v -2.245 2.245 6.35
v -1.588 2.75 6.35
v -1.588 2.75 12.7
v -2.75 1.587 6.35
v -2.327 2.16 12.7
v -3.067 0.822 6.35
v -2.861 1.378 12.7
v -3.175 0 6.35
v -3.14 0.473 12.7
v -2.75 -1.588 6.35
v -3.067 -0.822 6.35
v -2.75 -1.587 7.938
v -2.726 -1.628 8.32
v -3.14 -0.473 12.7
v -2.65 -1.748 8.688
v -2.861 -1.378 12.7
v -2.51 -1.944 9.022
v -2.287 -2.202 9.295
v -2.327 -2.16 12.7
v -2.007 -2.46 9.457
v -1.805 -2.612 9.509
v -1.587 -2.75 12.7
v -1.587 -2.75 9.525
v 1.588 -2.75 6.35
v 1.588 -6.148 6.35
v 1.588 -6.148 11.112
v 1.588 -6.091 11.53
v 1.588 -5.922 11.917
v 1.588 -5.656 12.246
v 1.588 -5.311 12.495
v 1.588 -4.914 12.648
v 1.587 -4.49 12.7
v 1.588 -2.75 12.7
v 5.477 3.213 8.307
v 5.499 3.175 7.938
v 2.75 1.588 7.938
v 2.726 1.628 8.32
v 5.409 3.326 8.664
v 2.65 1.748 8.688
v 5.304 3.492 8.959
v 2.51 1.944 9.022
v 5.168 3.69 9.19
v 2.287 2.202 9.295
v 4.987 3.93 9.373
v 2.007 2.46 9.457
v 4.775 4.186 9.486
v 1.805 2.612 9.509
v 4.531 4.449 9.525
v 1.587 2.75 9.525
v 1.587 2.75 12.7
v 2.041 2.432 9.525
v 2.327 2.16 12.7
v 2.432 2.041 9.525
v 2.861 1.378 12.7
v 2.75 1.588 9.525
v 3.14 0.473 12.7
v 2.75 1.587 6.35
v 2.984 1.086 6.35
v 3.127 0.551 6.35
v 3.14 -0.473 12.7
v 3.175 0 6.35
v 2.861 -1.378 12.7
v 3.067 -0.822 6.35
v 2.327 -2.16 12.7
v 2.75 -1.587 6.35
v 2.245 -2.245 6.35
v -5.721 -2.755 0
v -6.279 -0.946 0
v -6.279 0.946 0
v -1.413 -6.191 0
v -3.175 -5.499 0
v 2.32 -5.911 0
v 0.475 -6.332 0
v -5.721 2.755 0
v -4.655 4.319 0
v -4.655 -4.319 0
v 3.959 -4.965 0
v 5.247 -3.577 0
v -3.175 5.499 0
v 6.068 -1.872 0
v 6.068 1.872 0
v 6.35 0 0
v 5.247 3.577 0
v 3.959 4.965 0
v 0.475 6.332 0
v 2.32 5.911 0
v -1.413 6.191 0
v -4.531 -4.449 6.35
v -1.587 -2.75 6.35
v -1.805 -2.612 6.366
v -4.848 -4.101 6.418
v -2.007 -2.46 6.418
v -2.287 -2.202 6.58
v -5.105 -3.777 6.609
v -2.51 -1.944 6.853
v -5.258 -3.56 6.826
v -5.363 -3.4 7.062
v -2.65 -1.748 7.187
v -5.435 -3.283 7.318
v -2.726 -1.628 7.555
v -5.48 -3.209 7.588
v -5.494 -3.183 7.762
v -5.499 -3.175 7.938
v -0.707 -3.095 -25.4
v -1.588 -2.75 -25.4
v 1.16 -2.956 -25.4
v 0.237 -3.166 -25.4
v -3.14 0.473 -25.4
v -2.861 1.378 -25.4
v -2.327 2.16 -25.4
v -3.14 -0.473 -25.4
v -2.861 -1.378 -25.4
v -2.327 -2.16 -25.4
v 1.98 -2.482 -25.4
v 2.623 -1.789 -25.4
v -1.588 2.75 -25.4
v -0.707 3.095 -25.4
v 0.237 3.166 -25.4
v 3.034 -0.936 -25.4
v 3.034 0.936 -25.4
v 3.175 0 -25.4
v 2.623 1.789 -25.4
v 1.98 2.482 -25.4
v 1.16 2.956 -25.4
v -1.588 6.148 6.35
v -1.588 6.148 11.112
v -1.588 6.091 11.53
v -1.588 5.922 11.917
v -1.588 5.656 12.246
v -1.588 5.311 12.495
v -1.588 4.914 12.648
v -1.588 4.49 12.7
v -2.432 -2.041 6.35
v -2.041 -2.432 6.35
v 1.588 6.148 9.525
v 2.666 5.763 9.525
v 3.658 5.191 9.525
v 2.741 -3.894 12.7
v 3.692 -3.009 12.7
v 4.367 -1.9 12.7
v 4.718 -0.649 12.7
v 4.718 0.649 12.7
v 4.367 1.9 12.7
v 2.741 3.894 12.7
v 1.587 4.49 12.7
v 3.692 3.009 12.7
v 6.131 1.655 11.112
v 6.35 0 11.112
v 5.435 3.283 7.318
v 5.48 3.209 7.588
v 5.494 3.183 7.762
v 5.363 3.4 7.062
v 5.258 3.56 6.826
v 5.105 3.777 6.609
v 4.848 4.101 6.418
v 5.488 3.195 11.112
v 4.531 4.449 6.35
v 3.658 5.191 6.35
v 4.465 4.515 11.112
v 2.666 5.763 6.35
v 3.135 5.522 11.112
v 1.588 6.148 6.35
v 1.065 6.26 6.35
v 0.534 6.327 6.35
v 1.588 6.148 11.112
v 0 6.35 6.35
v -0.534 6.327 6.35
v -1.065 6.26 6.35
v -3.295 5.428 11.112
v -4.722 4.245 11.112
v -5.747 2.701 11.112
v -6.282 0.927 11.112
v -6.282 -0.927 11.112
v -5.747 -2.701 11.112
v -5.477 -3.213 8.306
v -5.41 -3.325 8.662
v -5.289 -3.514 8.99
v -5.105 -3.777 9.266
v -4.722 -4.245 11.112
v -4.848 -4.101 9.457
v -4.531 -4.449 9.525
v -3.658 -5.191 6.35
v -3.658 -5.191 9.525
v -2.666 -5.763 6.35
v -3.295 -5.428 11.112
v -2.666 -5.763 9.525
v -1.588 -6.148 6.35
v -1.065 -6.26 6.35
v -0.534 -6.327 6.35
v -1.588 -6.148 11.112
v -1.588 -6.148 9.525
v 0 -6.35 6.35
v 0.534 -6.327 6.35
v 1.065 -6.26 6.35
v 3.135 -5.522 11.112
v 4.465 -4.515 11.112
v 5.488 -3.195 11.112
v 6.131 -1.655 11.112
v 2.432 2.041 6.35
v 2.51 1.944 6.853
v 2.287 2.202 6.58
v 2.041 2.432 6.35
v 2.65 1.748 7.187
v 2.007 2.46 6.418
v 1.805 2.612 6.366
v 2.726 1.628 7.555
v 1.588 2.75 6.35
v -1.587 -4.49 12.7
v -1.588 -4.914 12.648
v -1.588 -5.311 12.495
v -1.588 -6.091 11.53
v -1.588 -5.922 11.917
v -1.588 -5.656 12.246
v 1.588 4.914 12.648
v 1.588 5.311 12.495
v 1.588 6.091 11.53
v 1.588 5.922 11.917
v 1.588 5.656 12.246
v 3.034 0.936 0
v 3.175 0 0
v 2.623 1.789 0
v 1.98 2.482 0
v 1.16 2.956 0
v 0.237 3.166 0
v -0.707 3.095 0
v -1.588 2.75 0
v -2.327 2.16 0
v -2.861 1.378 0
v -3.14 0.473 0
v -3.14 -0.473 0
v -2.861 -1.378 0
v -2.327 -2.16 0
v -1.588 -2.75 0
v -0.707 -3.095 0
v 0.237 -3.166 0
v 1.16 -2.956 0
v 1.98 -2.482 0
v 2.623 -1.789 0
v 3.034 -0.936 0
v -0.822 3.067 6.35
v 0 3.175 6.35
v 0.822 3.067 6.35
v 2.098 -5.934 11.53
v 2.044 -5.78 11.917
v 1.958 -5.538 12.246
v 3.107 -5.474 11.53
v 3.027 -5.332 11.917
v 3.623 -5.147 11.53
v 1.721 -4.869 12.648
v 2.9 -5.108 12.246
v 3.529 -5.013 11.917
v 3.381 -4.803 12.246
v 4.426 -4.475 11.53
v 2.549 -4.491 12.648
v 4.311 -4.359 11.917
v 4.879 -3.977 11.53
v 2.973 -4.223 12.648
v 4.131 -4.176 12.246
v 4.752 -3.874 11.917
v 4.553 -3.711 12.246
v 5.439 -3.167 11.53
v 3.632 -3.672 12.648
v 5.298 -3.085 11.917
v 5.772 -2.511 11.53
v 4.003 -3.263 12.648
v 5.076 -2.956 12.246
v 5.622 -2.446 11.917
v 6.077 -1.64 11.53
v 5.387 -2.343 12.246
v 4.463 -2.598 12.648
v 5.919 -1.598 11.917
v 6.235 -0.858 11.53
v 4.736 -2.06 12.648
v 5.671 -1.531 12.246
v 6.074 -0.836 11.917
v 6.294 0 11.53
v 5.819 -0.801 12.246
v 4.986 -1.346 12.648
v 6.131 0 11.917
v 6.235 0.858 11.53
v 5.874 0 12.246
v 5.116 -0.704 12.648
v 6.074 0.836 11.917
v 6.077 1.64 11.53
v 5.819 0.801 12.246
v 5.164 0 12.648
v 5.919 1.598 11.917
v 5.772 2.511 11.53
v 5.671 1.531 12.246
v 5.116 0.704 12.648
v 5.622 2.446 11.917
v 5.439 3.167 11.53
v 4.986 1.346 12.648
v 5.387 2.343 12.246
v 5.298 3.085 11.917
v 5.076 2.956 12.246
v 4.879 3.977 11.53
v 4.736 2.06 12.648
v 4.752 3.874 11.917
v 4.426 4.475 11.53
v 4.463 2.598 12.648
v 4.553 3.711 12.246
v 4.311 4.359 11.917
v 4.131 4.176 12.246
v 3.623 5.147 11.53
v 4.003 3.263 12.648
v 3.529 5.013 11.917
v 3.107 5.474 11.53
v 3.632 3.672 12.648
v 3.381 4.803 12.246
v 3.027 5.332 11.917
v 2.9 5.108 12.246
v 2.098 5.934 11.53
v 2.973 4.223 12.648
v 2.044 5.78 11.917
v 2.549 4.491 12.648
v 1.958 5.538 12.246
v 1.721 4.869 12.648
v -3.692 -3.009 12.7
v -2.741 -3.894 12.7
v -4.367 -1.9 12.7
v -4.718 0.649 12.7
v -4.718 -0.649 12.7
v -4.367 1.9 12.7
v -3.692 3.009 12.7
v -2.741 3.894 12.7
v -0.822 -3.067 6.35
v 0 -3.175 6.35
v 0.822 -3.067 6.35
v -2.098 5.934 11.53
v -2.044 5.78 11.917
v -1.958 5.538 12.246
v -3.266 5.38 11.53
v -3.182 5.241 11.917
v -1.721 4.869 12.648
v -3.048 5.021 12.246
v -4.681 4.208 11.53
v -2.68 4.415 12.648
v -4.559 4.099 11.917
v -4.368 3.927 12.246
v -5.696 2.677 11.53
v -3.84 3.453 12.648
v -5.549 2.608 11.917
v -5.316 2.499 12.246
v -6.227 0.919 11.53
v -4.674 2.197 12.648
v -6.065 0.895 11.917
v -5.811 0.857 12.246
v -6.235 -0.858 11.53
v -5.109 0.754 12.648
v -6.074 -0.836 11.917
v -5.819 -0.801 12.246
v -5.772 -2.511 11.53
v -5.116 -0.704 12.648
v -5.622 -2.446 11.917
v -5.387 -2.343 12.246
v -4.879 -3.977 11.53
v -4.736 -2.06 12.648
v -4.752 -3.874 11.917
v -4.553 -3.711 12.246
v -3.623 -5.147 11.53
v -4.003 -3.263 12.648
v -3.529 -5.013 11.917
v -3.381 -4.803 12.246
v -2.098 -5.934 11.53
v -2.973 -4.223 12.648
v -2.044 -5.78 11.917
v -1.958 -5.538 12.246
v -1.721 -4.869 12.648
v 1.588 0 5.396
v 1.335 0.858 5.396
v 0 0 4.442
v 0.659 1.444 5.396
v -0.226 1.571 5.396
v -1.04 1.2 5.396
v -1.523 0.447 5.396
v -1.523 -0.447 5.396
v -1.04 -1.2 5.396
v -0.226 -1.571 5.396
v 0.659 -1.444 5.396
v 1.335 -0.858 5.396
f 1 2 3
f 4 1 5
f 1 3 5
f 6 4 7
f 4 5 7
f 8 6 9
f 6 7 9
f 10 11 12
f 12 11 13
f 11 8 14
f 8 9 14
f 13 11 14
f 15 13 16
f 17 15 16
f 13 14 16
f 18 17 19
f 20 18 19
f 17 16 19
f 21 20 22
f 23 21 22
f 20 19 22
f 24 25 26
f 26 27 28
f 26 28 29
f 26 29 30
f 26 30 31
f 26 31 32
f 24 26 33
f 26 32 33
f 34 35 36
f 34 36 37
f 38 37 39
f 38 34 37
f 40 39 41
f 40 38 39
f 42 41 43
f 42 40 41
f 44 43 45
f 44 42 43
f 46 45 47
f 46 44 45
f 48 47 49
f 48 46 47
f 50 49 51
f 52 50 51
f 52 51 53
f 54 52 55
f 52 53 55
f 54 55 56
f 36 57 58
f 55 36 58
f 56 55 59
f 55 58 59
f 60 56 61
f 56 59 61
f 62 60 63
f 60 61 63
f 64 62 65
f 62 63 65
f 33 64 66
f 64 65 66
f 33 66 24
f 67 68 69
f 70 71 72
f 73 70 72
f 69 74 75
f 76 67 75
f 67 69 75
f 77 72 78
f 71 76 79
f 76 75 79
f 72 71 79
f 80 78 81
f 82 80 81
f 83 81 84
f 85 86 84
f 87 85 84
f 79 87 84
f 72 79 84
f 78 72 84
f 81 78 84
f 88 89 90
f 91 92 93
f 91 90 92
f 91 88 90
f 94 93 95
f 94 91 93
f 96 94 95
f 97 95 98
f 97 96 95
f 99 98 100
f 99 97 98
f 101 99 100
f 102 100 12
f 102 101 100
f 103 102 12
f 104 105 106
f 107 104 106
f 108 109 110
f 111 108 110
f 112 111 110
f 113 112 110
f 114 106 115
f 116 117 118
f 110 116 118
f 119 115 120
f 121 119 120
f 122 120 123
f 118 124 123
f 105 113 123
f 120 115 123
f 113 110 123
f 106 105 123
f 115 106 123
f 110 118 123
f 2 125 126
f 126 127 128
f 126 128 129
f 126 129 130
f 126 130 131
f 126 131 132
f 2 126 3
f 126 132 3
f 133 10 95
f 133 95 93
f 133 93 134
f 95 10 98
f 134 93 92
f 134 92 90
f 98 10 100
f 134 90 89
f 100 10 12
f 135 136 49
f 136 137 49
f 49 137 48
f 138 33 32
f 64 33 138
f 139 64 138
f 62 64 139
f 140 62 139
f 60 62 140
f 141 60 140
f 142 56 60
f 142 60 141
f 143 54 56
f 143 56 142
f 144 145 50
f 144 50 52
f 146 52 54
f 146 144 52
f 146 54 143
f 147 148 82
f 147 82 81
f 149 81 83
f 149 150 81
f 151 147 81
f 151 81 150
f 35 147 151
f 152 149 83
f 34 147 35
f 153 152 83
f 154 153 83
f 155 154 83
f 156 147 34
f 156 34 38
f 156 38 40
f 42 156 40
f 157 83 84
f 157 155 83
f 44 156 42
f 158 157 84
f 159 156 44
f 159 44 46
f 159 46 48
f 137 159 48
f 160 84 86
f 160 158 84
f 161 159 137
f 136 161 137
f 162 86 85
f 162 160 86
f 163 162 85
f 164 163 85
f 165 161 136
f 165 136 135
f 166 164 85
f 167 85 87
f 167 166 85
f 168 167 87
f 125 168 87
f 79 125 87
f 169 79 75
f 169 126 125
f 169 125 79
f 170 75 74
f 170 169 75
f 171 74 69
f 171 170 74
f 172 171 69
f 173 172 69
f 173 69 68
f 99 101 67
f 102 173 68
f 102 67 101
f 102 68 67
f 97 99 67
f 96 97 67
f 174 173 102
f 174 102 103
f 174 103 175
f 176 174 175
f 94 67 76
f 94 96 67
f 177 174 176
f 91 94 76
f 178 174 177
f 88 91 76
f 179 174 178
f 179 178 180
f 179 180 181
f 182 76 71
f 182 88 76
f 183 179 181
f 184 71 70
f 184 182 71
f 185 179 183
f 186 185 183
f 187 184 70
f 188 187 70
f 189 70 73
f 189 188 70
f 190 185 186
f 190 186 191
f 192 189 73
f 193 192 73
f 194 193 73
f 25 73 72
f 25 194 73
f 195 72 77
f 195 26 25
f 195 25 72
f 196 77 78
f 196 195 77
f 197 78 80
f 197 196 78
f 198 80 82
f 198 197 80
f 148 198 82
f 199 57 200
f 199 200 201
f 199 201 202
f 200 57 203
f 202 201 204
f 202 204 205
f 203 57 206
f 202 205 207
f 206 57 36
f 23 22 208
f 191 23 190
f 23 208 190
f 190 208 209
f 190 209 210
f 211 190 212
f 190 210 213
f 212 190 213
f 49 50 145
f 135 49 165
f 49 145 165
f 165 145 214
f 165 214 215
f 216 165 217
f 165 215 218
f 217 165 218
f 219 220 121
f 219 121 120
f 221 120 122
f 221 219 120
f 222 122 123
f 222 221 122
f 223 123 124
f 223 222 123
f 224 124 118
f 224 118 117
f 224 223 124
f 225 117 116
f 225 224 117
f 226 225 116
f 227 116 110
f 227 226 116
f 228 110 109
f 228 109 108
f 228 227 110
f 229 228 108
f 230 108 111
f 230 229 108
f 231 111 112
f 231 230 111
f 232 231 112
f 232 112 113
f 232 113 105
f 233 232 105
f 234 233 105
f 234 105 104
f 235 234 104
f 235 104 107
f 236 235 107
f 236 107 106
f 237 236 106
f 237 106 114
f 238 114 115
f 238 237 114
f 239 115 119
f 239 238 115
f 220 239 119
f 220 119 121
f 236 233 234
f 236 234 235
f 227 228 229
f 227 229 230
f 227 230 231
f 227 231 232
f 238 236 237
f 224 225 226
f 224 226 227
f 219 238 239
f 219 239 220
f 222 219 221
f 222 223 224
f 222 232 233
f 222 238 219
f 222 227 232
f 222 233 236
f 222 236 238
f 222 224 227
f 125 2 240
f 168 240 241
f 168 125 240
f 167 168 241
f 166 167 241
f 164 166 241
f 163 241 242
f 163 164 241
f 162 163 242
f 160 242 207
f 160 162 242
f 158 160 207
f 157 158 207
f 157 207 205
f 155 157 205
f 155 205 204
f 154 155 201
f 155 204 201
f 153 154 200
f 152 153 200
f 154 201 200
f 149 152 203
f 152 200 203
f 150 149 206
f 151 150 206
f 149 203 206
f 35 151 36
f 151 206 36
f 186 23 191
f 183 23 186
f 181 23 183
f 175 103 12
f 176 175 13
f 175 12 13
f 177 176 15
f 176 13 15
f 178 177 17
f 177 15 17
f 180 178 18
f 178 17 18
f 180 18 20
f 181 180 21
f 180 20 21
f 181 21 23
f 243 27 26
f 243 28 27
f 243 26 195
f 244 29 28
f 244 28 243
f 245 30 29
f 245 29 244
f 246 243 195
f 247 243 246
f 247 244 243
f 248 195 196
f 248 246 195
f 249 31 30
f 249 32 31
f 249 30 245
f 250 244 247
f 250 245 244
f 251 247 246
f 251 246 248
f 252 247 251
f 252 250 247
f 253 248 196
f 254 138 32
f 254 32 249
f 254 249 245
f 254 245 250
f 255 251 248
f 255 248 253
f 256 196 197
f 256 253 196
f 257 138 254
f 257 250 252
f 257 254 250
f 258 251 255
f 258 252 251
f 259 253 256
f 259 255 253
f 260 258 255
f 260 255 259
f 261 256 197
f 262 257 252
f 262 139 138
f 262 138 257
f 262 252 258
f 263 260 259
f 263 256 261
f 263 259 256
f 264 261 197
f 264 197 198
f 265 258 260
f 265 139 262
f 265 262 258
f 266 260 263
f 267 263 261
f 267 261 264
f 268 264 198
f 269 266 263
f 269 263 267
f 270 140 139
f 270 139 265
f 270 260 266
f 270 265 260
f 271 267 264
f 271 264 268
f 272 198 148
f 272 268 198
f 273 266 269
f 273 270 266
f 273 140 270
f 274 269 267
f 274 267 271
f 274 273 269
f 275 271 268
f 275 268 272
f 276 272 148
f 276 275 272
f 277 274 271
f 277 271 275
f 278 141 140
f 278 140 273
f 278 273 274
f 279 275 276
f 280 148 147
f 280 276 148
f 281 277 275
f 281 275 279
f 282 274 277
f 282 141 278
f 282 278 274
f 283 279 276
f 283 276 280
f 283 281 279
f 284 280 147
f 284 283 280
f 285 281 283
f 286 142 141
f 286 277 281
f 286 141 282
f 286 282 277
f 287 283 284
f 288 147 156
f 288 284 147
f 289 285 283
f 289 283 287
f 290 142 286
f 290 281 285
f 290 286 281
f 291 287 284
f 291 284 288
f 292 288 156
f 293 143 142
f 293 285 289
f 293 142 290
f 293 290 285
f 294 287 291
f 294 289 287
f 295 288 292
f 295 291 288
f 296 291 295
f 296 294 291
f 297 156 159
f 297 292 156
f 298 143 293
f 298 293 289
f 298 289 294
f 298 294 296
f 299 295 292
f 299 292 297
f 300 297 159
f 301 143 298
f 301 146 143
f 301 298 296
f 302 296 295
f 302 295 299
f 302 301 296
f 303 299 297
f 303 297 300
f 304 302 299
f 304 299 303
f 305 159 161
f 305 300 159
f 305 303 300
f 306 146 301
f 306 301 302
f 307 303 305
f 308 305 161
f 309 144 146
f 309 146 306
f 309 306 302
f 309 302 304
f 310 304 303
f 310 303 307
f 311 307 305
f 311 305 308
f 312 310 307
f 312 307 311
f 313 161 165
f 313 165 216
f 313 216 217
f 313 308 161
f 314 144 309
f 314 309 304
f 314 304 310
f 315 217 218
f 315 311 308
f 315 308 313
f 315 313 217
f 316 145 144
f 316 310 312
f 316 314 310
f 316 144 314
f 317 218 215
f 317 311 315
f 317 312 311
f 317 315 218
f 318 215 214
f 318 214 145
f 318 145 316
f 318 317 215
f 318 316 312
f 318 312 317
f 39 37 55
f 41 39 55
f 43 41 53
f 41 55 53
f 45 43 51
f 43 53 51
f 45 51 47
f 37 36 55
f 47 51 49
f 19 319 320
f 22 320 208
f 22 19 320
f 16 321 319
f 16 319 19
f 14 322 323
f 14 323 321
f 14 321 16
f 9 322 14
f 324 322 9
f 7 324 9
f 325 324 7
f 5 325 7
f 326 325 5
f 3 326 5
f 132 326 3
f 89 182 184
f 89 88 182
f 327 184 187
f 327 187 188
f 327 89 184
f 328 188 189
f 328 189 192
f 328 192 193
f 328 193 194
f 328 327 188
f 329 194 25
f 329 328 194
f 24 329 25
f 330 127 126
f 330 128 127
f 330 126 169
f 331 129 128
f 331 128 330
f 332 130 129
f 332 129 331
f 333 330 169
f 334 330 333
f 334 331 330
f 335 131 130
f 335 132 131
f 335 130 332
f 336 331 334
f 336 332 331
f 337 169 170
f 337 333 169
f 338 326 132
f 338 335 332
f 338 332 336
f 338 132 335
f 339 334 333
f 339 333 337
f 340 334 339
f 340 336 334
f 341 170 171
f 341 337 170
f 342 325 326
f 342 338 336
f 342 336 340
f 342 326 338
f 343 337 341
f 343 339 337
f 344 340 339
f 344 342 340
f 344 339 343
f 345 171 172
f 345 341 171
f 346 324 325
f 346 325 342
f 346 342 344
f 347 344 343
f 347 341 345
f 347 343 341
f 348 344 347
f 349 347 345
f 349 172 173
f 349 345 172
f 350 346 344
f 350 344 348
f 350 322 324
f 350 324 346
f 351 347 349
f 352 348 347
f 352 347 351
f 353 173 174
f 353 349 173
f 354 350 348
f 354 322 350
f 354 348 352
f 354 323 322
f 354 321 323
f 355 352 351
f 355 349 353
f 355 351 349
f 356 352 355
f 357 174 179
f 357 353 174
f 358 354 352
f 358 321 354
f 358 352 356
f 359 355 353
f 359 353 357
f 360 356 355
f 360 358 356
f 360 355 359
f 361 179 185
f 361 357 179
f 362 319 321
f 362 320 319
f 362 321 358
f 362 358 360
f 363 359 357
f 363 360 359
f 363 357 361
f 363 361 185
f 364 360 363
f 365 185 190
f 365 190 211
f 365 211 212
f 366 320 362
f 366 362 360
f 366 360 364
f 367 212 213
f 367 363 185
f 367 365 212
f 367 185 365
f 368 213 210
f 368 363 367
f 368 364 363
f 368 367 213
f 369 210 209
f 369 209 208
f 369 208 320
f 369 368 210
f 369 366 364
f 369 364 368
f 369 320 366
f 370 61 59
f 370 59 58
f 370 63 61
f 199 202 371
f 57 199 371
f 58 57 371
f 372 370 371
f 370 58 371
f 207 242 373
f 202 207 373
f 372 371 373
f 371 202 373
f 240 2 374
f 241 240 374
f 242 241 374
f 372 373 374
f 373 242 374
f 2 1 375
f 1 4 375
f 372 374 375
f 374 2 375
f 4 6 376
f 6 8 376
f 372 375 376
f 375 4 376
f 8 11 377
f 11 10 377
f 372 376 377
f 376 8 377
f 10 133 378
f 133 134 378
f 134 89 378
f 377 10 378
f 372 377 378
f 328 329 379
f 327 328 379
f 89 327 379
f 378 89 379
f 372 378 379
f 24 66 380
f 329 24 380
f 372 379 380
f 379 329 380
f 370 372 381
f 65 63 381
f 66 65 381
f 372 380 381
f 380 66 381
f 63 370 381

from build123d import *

# Parameters (mm, degrees)
F0_R          = 6.35
F1_DEPTH      = 12.7
F2_R          = 3.175
F3_DEPTH      = 25.4
F5_D          = 6.35
F5_DEPTH      = 6.35
F5_TIP        = 1.9077324654
F7_DEPTH      = 6.35
F10_W         = 4.7625
F10_H         = 3.175
F10_W_2       = 4.7752
F11_ANGLE     = 60
F12_T4_DEPTH  = 11.1125
F12_S5_R      = 6.35
F12_T6_DEPTH  = 8
F12_S7_R      = 3.175
F12_T8_DEPTH  = 8
F12_T12_DEPTH = 11.1125
F12_S13_R     = 6.35
F12_T14_DEPTH = 8
F12_S15_R     = 3.175
F12_T16_DEPTH = 8
F12_T20_DEPTH = 11.1125
F12_S21_R     = 6.35
F12_T22_DEPTH = 8
F12_S23_R     = 3.175
F12_T24_DEPTH = 8
F12_T28_DEPTH = 11.1125
F12_S29_R     = 6.35
F12_T30_DEPTH = 8
F12_S31_R     = 3.175
F12_T32_DEPTH = 8
F13_R         = 1.5875


# Not quite as in the source:
# - a fillet or chamfer that OpenCascade refuses, or shapes differently, is made with other operations: its cross-section is extruded or revolved along the edge and cut away or added
# - a feature names something its author has since deleted; it is built from what else it names


with BuildPart() as f1:
    # F0 (on Top) → F1 (new body)
    with BuildSketch(Plane.XY):
        Circle(F0_R)
    extrude(amount=F1_DEPTH)

    # F5
    with Locations(Plane.XY.offset(12.7)):
        with Locations((0, 0)):
            Hole(F5_D / 2, depth=F5_DEPTH)
            with Locations((0, 0, -(F5_DEPTH + F5_TIP / 2))):  # 118° drill point
                Cone(0, F5_D / 2, F5_TIP, mode=Mode.SUBTRACT)

    # F6 (on face) → F7 (cut)
    with BuildSketch(Plane.XY.offset(12.7)):
        with BuildLine():
            Line((-1.5875, -2.749630657), (-1.5875, -6.1483610621))
            ThreePointArc((-1.5875, -6.1483610621), (-0.8001272573, -6.2993885713), (0, -6.35))
            ThreePointArc((0, -6.35), (0.8001272573, -6.2993885713), (1.5875, -6.1483610621))
            Line((1.5875, -6.1483610621), (1.5875, -2.749630657))
            ThreePointArc((1.5875, -2.749630657), (0, -3.175), (-1.5875, -2.749630657))
        make_face()
        with BuildLine():
            ThreePointArc((1.5875, 6.1483610621), (0.8001272573, 6.2993885713), (0, 6.35))
            ThreePointArc((0, 6.35), (-0.8001272573, 6.2993885713), (-1.5875, 6.1483610621))
            Line((-1.5875, 6.1483610621), (-1.5875, 2.749630657))
            ThreePointArc((-1.5875, 2.749630657), (0, 3.175), (1.5875, 2.749630657))
            Line((1.5875, 2.749630657), (1.5875, 6.1483610621))
        make_face()
    extrude(amount=-F7_DEPTH, mode=Mode.SUBTRACT)

    # F10 (on face) → F11 (revolve, cut)
    with BuildSketch(Plane.YZ):
        with Locations((-3.96875, 7.9375)):
            Rectangle(F10_W, F10_H)
        with Locations((3.9624, 7.9375)):
            Rectangle(F10_W_2, F10_H)
    revolve(axis=Axis((0, 0, 6.35), (0, 0, -1)), revolution_arc=F11_ANGLE, mode=Mode.SUBTRACT)

    # F12: fillet of radius 1.5875 on 4 edges, made by hand


with BuildPart() as f3:
    # F2 (on Top) → F3 (new body)
    with BuildSketch(Plane.XY):
        Circle(F2_R)
    extrude(amount=-F3_DEPTH)


with BuildPart() as f12_tool2:
    # F12_s3 → F12_t4 (new body)
    with BuildSketch(Plane(origin=(0.6874076643, 0.396875, 0), x_dir=(0, 0, 1), z_dir=(-0.8660254038, -0.5, 0))):
        with BuildLine():
            ThreePointArc((7.9375, 0), (9.0600320151, -0.4649679849), (9.525, -1.5875))
            Line((9.525, -1.5875), (9.525, 0))
            Line((9.525, 0), (7.9375, 0))
        make_face()
    extrude(amount=F12_T4_DEPTH)

    # F12_s5 → F12_t6 (intersect, symmetric)
    with BuildSketch(Plane.XY.offset(8.7)):
        Circle(F12_S5_R)
    extrude(amount=F12_T6_DEPTH, both=True, mode=Mode.INTERSECT)

    # F12_s7 → F12_t8 (cut, symmetric)
    with BuildSketch(Plane.XY.offset(8.7)):
        Circle(F12_S7_R)
    extrude(amount=F12_T8_DEPTH, both=True, mode=Mode.SUBTRACT)


with BuildPart() as f1_1:
    add(f1.part)

    # F12_t1: union F12_tool2
    add(f12_tool2.part)


with BuildPart() as f12_tool10:
    # F12_s11 → F12_t12 (new body)
    with BuildSketch(Plane(origin=(-8.9362996353, -5.159375, 0), x_dir=(0, 0, 1), z_dir=(0.8660254038, 0.5, 0))):
        with BuildLine():
            ThreePointArc((6.35, 1.5875), (6.8149679849, 0.4649679849), (7.9375, 0))
            Line((7.9375, 0), (6.35, 0))
            Line((6.35, 0), (6.35, 1.5875))
        make_face()
    extrude(amount=F12_T12_DEPTH)

    # F12_s13 → F12_t14 (intersect, symmetric)
    with BuildSketch(Plane.XY.offset(7.1)):
        Circle(F12_S13_R)
    extrude(amount=F12_T14_DEPTH, both=True, mode=Mode.INTERSECT)

    # F12_s15 → F12_t16 (cut, symmetric)
    with BuildSketch(Plane.XY.offset(7.1)):
        Circle(F12_S15_R)
    extrude(amount=F12_T16_DEPTH, both=True, mode=Mode.SUBTRACT)


with BuildPart() as f1_2:
    add(f1_1.part)

    # F12_t9: union F12_tool10
    add(f12_tool10.part)


with BuildPart() as f12_tool18:
    # F12_s19 → F12_t20 (new body)
    with BuildSketch(Plane(origin=(8.9362996353, 5.159375, 0), x_dir=(0, 0, 1), z_dir=(-0.8660254038, -0.5, 0))):
        with BuildLine():
            ThreePointArc((7.9375, 0), (9.0600320151, 0.4649679849), (9.525, 1.5875))
            Line((9.525, 1.5875), (9.525, 0))
            Line((9.525, 0), (7.9375, 0))
        make_face()
    extrude(amount=F12_T20_DEPTH)

    # F12_s21 → F12_t22 (intersect, symmetric)
    with BuildSketch(Plane.XY.offset(8.7)):
        Circle(F12_S21_R)
    extrude(amount=F12_T22_DEPTH, both=True, mode=Mode.INTERSECT)

    # F12_s23 → F12_t24 (cut, symmetric)
    with BuildSketch(Plane.XY.offset(8.7)):
        Circle(F12_S23_R)
    extrude(amount=F12_T24_DEPTH, both=True, mode=Mode.SUBTRACT)


with BuildPart() as f1_3:
    add(f1_2.part)

    # F12_t17: union F12_tool18
    add(f12_tool18.part)


with BuildPart() as f12_tool26:
    # F12_s27 → F12_t28 (new body)
    with BuildSketch(Plane(origin=(-0.6874076643, -0.396875, 0), x_dir=(0, 0, 1), z_dir=(0.8660254038, 0.5, 0))):
        with BuildLine():
            ThreePointArc((6.35, -1.5875), (6.8149679849, -0.4649679849), (7.9375, 0))
            Line((7.9375, 0), (6.35, 0))
            Line((6.35, 0), (6.35, -1.5875))
        make_face()
    extrude(amount=F12_T28_DEPTH)

    # F12_s29 → F12_t30 (intersect, symmetric)
    with BuildSketch(Plane.XY.offset(7.1)):
        Circle(F12_S29_R)
    extrude(amount=F12_T30_DEPTH, both=True, mode=Mode.INTERSECT)

    # F12_s31 → F12_t32 (cut, symmetric)
    with BuildSketch(Plane.XY.offset(7.1)):
        Circle(F12_S31_R)
    extrude(amount=F12_T32_DEPTH, both=True, mode=Mode.SUBTRACT)


with BuildPart() as f1_4:
    add(f1_3.part)

    # F12_t25: union F12_tool26
    add(f12_tool26.part)

    # F13
    f13_edges = [f1_4.edges().sort_by_distance(p)[0] for p in [
        (-6.35, 0, 12.7),
        (5.020116, 3.888565, 12.7),
        (5.020116, -3.888565, 12.7),
    ]]
    fillet(f13_edges, radius=F13_R)


solid = Compound([f3.part, f1_4.part])
